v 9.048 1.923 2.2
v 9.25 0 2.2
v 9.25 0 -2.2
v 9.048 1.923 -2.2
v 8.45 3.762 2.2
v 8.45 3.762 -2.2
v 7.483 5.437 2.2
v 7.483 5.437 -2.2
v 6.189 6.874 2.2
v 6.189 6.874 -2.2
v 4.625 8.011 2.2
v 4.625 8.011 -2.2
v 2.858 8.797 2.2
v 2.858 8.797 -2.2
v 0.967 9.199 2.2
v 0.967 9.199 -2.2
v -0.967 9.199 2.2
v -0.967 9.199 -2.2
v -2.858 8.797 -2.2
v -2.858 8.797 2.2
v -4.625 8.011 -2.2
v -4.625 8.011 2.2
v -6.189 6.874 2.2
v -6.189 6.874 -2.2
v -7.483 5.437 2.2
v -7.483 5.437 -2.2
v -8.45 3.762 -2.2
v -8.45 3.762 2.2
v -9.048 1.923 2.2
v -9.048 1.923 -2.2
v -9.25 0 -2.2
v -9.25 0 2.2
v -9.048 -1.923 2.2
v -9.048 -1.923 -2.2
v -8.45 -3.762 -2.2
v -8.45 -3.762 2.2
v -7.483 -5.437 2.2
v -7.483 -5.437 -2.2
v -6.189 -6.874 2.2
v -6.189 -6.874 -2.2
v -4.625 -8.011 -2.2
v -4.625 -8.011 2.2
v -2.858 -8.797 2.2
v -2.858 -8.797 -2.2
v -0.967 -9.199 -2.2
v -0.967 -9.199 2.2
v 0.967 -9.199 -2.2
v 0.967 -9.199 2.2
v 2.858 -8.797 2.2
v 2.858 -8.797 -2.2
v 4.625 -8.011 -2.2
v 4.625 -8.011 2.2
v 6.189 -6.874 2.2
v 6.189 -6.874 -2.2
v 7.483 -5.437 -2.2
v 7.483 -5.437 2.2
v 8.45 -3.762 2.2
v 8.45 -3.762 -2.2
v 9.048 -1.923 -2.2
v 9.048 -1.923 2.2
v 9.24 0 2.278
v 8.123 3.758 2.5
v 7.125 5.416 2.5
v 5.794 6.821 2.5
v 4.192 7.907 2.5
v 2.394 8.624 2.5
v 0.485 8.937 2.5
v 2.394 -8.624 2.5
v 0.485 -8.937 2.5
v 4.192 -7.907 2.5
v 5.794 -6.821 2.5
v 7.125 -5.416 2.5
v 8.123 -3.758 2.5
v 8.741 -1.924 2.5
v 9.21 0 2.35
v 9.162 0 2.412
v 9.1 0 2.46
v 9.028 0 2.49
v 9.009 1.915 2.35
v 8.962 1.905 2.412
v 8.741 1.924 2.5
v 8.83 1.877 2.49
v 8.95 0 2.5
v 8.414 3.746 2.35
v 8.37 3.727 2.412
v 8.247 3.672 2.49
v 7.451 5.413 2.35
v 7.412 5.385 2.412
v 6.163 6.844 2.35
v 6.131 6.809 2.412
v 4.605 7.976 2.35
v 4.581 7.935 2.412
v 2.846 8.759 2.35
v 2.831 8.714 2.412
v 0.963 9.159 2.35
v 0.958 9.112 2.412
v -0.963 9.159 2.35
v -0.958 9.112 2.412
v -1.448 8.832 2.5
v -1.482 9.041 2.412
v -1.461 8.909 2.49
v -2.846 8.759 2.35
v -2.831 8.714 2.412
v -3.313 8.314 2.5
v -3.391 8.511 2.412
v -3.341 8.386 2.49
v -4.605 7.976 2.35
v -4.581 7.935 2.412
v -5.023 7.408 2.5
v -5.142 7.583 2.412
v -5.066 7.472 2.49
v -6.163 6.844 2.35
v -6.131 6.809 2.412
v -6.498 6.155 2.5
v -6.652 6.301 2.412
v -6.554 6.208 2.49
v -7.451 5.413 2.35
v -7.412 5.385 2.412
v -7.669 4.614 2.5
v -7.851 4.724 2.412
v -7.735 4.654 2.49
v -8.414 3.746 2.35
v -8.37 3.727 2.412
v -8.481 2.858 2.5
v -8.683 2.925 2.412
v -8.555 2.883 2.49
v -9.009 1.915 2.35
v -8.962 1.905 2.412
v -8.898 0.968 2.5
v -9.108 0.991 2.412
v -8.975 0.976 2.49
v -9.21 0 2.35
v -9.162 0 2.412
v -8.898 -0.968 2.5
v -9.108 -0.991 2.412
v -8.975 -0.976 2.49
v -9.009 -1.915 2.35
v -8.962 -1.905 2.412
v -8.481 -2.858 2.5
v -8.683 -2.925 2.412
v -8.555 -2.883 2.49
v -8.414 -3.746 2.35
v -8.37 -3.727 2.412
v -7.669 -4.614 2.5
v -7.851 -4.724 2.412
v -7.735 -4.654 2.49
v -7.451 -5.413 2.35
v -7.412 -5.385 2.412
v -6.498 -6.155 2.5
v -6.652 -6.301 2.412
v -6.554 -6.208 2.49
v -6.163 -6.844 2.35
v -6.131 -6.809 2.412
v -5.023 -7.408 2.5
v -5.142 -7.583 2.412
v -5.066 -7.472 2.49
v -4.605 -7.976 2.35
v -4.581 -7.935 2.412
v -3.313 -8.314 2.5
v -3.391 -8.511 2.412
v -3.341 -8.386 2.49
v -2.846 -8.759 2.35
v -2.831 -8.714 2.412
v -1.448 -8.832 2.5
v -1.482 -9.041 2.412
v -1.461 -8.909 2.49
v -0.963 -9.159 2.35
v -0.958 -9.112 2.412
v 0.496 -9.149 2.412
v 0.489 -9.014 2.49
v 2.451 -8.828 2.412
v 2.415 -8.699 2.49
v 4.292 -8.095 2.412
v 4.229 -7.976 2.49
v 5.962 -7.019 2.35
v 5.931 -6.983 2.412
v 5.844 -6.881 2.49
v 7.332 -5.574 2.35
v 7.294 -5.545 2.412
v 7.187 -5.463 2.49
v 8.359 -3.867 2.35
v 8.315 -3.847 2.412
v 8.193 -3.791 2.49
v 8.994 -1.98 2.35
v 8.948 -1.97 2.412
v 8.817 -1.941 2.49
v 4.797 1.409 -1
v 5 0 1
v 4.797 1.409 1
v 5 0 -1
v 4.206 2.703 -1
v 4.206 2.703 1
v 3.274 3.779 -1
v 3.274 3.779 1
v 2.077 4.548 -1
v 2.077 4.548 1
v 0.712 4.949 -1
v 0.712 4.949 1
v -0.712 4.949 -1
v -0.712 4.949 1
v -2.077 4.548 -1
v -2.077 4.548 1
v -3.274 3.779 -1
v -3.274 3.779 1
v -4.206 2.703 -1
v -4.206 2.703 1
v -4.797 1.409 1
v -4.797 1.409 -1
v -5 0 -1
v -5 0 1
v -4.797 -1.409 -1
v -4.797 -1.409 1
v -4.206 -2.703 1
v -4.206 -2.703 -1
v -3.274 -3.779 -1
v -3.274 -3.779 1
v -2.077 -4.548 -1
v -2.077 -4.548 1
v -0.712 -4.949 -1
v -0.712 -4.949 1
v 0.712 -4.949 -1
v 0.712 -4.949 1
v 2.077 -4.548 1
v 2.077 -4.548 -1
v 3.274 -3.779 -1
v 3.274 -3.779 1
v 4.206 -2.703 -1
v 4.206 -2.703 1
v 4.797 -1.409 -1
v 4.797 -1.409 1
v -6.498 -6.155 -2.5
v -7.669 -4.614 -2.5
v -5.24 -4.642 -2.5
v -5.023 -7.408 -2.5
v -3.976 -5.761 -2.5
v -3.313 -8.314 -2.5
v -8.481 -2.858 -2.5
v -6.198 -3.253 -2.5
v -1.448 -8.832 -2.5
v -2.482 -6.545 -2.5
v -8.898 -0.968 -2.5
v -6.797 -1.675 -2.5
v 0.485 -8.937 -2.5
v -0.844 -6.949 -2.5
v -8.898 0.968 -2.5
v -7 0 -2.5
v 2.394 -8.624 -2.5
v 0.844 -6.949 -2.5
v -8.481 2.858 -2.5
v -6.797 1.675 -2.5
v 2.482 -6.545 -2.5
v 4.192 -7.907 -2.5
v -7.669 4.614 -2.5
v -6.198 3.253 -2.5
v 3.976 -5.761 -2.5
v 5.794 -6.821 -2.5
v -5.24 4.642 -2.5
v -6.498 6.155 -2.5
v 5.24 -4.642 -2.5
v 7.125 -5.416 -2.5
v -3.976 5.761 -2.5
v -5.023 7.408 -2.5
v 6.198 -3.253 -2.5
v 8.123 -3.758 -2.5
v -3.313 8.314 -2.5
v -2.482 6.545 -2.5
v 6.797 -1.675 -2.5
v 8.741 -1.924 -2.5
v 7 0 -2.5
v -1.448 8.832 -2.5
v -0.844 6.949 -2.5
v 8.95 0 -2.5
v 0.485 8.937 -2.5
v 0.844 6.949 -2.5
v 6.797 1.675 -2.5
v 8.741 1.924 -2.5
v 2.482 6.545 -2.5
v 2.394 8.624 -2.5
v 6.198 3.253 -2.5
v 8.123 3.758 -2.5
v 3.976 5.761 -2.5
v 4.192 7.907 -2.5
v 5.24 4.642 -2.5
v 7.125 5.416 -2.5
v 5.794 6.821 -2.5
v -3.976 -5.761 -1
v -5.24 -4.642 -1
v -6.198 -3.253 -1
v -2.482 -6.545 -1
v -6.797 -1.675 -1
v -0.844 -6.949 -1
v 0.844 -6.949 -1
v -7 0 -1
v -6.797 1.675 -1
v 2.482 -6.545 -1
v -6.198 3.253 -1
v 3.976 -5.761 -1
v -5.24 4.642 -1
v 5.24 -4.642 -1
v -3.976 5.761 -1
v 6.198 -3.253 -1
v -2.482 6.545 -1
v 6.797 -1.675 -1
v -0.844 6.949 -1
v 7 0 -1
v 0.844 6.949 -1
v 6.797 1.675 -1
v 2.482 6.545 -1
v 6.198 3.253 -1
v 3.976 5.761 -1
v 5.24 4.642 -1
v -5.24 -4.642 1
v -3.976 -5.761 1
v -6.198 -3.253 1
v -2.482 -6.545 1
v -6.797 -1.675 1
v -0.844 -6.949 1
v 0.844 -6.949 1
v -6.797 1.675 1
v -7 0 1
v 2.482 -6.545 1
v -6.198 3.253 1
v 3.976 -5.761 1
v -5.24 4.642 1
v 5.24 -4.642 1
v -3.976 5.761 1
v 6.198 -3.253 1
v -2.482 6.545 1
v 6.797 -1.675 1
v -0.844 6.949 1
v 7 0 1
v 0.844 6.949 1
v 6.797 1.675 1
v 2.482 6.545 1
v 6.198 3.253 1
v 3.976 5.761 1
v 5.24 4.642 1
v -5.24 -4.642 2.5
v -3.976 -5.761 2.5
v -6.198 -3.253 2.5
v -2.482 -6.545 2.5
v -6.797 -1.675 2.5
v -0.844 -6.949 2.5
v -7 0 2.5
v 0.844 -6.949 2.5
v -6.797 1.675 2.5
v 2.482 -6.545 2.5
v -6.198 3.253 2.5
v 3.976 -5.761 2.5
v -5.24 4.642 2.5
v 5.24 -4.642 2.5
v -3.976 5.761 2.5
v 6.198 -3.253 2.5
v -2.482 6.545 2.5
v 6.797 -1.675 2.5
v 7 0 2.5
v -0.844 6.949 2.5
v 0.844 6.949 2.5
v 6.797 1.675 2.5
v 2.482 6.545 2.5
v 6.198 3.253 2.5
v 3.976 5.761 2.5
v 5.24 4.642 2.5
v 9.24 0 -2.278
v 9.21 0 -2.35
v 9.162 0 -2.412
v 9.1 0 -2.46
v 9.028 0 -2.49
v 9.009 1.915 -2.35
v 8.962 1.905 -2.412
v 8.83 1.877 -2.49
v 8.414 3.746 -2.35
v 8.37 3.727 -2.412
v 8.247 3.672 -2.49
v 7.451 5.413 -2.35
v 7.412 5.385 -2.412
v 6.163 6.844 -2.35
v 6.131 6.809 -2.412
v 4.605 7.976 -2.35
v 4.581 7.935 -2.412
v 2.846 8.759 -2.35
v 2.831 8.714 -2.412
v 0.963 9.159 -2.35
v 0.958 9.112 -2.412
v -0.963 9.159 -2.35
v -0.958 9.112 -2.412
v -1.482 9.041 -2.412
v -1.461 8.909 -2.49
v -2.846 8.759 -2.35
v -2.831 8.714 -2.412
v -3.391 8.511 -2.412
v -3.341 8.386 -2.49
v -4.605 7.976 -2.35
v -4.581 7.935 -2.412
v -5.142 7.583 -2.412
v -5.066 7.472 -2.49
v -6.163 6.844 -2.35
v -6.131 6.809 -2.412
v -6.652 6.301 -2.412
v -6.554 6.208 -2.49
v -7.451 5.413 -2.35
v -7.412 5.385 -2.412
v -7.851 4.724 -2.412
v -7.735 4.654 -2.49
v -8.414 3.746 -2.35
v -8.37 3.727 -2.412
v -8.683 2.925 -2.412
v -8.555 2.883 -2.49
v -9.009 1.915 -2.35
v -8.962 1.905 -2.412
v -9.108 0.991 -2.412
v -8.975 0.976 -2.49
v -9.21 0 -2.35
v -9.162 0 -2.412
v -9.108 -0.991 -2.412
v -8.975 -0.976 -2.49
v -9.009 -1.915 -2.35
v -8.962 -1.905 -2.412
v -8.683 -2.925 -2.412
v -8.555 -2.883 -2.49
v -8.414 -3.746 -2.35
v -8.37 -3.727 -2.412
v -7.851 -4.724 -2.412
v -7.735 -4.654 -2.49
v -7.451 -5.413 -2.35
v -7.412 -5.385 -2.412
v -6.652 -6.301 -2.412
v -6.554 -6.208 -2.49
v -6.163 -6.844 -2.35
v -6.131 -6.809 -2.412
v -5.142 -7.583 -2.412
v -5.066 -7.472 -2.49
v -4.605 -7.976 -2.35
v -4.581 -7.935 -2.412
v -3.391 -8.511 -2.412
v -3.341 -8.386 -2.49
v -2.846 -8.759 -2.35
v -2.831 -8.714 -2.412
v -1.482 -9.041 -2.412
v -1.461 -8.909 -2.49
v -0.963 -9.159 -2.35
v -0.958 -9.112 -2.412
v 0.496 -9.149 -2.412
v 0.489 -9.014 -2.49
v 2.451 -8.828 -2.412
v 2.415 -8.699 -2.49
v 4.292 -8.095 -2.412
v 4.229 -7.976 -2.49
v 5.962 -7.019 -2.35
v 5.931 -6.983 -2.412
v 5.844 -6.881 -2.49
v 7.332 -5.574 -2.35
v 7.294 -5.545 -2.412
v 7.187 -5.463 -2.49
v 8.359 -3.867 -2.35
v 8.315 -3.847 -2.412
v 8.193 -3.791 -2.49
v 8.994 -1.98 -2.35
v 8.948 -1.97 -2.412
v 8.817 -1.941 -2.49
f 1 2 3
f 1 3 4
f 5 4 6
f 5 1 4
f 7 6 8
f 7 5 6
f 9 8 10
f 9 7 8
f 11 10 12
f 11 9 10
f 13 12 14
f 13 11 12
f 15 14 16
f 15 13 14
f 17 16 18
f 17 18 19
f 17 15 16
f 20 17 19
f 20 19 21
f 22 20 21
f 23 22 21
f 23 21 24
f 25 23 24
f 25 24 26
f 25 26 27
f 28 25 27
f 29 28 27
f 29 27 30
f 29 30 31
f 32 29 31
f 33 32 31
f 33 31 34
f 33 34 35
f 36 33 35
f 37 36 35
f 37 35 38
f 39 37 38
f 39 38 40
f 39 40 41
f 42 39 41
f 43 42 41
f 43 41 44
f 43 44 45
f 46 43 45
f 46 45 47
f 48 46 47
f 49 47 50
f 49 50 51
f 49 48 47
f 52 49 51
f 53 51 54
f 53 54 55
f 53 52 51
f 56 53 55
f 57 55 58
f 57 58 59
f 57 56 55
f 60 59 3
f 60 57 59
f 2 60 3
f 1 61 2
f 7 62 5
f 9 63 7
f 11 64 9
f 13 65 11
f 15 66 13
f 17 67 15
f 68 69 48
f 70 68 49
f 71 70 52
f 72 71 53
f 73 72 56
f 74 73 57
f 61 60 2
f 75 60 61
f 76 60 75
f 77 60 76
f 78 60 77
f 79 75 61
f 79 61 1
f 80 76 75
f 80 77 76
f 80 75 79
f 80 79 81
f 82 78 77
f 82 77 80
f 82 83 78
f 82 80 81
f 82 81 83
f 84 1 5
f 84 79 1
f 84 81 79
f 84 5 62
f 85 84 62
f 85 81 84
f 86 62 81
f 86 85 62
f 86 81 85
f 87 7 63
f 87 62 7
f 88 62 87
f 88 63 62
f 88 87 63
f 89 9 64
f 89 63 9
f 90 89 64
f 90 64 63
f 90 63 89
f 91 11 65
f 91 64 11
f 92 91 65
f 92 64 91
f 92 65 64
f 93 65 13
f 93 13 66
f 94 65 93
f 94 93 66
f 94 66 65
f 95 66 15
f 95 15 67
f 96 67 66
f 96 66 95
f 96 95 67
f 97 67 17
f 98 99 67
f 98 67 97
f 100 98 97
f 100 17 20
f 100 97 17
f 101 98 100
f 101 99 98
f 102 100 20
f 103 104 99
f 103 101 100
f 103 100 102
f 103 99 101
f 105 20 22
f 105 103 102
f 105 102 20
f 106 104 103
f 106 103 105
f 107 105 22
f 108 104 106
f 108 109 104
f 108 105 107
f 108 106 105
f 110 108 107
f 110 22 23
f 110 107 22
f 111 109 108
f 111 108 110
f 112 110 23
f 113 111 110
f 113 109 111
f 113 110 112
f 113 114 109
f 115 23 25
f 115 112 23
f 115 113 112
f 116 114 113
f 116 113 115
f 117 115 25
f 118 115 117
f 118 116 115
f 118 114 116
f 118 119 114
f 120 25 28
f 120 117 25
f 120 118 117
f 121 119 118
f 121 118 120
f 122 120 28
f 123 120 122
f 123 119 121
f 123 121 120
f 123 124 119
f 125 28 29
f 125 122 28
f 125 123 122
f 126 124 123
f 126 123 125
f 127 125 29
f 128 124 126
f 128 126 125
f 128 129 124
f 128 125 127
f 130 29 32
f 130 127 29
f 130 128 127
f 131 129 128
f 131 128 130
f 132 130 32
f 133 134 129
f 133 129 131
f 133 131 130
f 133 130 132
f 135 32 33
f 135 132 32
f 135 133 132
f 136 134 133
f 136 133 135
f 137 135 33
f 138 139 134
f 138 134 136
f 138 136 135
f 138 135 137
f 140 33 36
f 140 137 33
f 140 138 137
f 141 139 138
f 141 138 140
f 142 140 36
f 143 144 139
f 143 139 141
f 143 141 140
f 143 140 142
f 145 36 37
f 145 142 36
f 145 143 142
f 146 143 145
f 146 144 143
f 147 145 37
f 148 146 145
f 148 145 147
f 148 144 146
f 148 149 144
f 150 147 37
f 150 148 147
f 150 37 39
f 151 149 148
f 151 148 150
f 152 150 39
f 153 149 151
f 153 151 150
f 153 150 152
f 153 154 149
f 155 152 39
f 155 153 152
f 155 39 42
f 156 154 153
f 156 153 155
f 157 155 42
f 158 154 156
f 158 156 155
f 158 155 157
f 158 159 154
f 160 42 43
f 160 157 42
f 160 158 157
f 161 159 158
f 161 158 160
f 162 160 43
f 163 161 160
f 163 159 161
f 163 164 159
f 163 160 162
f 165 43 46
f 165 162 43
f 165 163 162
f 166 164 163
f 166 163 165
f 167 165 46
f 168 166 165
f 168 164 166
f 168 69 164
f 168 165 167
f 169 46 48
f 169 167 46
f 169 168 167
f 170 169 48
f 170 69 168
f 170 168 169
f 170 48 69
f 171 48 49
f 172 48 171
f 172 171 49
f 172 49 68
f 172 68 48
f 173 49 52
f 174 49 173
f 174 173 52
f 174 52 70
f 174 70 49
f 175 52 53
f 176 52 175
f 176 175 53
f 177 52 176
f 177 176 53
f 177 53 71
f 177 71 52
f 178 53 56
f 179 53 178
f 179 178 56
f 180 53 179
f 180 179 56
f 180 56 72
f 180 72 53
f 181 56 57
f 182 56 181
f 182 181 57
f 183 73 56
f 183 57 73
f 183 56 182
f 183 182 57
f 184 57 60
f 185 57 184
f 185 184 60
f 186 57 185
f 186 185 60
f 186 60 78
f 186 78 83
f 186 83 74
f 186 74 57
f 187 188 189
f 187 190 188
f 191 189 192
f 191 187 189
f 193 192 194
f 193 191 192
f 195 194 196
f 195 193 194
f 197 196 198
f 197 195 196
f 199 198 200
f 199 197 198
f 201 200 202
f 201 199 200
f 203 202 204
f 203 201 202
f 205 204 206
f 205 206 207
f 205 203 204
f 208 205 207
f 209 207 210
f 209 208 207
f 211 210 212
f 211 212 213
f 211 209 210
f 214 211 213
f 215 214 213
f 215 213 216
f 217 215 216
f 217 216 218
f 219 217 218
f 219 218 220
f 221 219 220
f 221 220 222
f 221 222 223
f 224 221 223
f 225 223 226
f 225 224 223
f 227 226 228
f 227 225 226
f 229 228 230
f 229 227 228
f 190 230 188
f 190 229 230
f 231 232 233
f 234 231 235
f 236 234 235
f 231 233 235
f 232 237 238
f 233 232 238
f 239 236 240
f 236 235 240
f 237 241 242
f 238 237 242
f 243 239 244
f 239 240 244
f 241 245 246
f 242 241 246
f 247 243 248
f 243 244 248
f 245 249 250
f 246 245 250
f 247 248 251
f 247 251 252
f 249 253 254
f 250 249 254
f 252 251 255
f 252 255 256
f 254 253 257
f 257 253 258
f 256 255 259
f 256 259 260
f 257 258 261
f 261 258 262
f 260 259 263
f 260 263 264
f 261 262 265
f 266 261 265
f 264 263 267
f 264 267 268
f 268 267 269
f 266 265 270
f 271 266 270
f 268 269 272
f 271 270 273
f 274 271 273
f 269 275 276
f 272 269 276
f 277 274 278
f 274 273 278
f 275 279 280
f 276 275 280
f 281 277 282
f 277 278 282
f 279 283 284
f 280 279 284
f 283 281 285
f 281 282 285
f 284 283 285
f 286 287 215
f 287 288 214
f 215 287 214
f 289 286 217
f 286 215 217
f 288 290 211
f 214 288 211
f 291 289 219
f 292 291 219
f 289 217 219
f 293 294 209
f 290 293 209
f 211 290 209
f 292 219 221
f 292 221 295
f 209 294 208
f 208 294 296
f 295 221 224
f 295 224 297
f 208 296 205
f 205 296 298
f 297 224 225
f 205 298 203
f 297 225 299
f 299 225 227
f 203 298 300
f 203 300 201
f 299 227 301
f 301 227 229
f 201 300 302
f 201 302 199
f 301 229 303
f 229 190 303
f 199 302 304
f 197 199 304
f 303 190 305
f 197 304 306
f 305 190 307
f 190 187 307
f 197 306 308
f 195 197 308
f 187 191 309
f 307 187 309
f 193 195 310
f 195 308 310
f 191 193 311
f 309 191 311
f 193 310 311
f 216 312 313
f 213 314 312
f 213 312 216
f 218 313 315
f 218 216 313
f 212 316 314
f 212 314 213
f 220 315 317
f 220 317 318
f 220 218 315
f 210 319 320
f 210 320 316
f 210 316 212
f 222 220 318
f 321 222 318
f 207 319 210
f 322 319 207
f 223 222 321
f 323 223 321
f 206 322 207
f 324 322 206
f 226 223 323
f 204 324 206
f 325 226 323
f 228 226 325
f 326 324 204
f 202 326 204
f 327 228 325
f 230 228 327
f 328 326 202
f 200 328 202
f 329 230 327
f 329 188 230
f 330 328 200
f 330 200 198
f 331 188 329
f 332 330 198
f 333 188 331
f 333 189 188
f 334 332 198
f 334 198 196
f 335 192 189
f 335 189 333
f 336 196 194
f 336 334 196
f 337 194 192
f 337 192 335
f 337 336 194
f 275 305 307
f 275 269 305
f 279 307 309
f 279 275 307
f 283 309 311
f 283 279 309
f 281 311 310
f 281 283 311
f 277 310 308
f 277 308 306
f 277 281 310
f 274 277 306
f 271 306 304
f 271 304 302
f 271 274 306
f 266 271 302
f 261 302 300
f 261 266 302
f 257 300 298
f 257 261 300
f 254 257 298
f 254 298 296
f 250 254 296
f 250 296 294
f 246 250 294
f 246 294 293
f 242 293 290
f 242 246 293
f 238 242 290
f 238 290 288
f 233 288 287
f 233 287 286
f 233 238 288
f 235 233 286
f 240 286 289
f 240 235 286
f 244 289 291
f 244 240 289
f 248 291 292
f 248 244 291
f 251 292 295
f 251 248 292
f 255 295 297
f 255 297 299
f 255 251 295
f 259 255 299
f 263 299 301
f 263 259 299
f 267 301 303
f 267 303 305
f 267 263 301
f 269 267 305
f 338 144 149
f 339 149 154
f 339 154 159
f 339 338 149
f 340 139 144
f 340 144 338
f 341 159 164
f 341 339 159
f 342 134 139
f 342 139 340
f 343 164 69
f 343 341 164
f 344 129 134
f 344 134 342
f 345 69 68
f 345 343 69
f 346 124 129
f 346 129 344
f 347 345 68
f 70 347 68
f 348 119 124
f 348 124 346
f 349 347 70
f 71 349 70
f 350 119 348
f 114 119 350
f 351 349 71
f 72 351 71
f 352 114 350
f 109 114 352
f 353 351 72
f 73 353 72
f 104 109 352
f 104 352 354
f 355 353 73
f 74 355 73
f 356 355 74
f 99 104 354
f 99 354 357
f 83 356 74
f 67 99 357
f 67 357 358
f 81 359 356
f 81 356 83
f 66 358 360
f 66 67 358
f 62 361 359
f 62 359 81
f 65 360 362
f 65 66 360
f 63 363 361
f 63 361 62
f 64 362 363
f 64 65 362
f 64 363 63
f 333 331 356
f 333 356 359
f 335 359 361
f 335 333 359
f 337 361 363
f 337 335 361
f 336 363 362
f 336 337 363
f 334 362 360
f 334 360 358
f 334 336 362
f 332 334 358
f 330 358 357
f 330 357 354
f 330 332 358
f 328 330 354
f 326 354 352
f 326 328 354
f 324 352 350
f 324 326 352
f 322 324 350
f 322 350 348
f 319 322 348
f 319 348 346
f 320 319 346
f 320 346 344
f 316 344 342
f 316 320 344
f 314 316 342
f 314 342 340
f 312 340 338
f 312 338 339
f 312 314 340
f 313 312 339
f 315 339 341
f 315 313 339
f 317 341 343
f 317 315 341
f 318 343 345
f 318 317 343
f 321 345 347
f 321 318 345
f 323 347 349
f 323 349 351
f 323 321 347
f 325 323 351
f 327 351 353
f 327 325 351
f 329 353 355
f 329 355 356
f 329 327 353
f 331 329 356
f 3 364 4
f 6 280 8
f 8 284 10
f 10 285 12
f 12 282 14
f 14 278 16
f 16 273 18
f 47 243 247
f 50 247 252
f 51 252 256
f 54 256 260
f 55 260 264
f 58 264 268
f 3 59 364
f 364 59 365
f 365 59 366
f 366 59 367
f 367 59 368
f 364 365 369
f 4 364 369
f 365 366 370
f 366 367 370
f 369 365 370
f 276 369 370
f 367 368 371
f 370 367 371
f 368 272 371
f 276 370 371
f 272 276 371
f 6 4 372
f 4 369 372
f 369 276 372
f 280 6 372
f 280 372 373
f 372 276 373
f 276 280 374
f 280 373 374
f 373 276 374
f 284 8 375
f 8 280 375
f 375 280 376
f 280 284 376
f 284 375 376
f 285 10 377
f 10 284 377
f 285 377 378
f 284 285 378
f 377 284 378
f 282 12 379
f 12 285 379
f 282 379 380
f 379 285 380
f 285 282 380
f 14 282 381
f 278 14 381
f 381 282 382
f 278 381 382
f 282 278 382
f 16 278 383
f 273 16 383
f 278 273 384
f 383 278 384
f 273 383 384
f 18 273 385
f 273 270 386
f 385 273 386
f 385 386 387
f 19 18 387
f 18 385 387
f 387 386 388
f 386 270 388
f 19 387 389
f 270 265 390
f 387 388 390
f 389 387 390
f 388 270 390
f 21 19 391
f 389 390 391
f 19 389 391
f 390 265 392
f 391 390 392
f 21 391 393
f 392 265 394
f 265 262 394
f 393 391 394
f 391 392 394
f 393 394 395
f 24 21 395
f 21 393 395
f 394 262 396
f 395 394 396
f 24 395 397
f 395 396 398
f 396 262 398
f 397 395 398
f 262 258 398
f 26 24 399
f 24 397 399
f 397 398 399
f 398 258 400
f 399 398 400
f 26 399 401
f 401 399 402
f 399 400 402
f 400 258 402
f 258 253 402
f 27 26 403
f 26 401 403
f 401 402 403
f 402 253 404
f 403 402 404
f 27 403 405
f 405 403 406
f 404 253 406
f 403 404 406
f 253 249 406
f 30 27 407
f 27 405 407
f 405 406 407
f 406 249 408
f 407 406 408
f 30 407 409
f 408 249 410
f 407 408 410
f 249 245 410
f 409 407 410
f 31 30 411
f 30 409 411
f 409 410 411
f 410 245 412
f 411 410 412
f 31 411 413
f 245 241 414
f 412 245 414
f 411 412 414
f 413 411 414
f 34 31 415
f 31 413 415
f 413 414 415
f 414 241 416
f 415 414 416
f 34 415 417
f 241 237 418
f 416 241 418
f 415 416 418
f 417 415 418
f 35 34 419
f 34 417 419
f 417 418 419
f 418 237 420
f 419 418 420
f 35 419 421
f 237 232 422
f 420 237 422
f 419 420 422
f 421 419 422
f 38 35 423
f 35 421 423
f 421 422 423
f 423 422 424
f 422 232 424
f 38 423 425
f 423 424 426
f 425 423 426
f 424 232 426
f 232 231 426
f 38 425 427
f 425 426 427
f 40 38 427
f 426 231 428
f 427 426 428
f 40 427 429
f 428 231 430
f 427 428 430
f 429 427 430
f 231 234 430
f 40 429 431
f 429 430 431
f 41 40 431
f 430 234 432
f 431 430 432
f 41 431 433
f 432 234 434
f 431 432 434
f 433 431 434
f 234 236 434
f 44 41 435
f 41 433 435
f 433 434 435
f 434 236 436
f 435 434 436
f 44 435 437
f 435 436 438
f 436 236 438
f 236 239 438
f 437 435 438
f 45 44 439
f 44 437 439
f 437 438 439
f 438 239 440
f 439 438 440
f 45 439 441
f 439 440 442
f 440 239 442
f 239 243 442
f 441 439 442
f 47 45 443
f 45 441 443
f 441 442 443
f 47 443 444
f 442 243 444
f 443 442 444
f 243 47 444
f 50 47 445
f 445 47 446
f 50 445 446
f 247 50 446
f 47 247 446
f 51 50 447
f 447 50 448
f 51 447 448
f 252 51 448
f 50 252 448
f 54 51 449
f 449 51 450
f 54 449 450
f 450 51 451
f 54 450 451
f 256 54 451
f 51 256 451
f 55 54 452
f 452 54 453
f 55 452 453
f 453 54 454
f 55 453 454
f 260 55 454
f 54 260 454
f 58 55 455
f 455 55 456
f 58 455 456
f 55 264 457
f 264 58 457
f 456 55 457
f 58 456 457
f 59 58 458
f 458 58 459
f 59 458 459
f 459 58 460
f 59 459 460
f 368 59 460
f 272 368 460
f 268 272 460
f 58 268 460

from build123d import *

# Parameters (mm, degrees)
F0_R     = 9.25
F0_R_2   = 7
F1_DEPTH = 2.5
F0_R_3   = 5
F2_DEPTH = 1
F3_R     = 0.3


with BuildPart() as f1:
    # F0 (on Top) → F1 (new body, symmetric)
    with BuildSketch(Plane.XY):
        Circle(F0_R)
        Circle(F0_R_2, mode=Mode.SUBTRACT)
    extrude(amount=F1_DEPTH, both=True)

    # F0 (on Top) → F2 (join, symmetric)
    with BuildSketch(Plane.XY):
        Circle(F0_R_2)
        Circle(F0_R_3, mode=Mode.SUBTRACT)
    extrude(amount=F2_DEPTH, both=True)

    # F3
    f3_edges = [f1.edges().sort_by_distance(p)[0] for p in [
        (-9.25, 0, 2.5),
        (-9.25, 0, -2.5),
    ]]
    fillet(f3_edges, radius=F3_R)


solid = f1.part
